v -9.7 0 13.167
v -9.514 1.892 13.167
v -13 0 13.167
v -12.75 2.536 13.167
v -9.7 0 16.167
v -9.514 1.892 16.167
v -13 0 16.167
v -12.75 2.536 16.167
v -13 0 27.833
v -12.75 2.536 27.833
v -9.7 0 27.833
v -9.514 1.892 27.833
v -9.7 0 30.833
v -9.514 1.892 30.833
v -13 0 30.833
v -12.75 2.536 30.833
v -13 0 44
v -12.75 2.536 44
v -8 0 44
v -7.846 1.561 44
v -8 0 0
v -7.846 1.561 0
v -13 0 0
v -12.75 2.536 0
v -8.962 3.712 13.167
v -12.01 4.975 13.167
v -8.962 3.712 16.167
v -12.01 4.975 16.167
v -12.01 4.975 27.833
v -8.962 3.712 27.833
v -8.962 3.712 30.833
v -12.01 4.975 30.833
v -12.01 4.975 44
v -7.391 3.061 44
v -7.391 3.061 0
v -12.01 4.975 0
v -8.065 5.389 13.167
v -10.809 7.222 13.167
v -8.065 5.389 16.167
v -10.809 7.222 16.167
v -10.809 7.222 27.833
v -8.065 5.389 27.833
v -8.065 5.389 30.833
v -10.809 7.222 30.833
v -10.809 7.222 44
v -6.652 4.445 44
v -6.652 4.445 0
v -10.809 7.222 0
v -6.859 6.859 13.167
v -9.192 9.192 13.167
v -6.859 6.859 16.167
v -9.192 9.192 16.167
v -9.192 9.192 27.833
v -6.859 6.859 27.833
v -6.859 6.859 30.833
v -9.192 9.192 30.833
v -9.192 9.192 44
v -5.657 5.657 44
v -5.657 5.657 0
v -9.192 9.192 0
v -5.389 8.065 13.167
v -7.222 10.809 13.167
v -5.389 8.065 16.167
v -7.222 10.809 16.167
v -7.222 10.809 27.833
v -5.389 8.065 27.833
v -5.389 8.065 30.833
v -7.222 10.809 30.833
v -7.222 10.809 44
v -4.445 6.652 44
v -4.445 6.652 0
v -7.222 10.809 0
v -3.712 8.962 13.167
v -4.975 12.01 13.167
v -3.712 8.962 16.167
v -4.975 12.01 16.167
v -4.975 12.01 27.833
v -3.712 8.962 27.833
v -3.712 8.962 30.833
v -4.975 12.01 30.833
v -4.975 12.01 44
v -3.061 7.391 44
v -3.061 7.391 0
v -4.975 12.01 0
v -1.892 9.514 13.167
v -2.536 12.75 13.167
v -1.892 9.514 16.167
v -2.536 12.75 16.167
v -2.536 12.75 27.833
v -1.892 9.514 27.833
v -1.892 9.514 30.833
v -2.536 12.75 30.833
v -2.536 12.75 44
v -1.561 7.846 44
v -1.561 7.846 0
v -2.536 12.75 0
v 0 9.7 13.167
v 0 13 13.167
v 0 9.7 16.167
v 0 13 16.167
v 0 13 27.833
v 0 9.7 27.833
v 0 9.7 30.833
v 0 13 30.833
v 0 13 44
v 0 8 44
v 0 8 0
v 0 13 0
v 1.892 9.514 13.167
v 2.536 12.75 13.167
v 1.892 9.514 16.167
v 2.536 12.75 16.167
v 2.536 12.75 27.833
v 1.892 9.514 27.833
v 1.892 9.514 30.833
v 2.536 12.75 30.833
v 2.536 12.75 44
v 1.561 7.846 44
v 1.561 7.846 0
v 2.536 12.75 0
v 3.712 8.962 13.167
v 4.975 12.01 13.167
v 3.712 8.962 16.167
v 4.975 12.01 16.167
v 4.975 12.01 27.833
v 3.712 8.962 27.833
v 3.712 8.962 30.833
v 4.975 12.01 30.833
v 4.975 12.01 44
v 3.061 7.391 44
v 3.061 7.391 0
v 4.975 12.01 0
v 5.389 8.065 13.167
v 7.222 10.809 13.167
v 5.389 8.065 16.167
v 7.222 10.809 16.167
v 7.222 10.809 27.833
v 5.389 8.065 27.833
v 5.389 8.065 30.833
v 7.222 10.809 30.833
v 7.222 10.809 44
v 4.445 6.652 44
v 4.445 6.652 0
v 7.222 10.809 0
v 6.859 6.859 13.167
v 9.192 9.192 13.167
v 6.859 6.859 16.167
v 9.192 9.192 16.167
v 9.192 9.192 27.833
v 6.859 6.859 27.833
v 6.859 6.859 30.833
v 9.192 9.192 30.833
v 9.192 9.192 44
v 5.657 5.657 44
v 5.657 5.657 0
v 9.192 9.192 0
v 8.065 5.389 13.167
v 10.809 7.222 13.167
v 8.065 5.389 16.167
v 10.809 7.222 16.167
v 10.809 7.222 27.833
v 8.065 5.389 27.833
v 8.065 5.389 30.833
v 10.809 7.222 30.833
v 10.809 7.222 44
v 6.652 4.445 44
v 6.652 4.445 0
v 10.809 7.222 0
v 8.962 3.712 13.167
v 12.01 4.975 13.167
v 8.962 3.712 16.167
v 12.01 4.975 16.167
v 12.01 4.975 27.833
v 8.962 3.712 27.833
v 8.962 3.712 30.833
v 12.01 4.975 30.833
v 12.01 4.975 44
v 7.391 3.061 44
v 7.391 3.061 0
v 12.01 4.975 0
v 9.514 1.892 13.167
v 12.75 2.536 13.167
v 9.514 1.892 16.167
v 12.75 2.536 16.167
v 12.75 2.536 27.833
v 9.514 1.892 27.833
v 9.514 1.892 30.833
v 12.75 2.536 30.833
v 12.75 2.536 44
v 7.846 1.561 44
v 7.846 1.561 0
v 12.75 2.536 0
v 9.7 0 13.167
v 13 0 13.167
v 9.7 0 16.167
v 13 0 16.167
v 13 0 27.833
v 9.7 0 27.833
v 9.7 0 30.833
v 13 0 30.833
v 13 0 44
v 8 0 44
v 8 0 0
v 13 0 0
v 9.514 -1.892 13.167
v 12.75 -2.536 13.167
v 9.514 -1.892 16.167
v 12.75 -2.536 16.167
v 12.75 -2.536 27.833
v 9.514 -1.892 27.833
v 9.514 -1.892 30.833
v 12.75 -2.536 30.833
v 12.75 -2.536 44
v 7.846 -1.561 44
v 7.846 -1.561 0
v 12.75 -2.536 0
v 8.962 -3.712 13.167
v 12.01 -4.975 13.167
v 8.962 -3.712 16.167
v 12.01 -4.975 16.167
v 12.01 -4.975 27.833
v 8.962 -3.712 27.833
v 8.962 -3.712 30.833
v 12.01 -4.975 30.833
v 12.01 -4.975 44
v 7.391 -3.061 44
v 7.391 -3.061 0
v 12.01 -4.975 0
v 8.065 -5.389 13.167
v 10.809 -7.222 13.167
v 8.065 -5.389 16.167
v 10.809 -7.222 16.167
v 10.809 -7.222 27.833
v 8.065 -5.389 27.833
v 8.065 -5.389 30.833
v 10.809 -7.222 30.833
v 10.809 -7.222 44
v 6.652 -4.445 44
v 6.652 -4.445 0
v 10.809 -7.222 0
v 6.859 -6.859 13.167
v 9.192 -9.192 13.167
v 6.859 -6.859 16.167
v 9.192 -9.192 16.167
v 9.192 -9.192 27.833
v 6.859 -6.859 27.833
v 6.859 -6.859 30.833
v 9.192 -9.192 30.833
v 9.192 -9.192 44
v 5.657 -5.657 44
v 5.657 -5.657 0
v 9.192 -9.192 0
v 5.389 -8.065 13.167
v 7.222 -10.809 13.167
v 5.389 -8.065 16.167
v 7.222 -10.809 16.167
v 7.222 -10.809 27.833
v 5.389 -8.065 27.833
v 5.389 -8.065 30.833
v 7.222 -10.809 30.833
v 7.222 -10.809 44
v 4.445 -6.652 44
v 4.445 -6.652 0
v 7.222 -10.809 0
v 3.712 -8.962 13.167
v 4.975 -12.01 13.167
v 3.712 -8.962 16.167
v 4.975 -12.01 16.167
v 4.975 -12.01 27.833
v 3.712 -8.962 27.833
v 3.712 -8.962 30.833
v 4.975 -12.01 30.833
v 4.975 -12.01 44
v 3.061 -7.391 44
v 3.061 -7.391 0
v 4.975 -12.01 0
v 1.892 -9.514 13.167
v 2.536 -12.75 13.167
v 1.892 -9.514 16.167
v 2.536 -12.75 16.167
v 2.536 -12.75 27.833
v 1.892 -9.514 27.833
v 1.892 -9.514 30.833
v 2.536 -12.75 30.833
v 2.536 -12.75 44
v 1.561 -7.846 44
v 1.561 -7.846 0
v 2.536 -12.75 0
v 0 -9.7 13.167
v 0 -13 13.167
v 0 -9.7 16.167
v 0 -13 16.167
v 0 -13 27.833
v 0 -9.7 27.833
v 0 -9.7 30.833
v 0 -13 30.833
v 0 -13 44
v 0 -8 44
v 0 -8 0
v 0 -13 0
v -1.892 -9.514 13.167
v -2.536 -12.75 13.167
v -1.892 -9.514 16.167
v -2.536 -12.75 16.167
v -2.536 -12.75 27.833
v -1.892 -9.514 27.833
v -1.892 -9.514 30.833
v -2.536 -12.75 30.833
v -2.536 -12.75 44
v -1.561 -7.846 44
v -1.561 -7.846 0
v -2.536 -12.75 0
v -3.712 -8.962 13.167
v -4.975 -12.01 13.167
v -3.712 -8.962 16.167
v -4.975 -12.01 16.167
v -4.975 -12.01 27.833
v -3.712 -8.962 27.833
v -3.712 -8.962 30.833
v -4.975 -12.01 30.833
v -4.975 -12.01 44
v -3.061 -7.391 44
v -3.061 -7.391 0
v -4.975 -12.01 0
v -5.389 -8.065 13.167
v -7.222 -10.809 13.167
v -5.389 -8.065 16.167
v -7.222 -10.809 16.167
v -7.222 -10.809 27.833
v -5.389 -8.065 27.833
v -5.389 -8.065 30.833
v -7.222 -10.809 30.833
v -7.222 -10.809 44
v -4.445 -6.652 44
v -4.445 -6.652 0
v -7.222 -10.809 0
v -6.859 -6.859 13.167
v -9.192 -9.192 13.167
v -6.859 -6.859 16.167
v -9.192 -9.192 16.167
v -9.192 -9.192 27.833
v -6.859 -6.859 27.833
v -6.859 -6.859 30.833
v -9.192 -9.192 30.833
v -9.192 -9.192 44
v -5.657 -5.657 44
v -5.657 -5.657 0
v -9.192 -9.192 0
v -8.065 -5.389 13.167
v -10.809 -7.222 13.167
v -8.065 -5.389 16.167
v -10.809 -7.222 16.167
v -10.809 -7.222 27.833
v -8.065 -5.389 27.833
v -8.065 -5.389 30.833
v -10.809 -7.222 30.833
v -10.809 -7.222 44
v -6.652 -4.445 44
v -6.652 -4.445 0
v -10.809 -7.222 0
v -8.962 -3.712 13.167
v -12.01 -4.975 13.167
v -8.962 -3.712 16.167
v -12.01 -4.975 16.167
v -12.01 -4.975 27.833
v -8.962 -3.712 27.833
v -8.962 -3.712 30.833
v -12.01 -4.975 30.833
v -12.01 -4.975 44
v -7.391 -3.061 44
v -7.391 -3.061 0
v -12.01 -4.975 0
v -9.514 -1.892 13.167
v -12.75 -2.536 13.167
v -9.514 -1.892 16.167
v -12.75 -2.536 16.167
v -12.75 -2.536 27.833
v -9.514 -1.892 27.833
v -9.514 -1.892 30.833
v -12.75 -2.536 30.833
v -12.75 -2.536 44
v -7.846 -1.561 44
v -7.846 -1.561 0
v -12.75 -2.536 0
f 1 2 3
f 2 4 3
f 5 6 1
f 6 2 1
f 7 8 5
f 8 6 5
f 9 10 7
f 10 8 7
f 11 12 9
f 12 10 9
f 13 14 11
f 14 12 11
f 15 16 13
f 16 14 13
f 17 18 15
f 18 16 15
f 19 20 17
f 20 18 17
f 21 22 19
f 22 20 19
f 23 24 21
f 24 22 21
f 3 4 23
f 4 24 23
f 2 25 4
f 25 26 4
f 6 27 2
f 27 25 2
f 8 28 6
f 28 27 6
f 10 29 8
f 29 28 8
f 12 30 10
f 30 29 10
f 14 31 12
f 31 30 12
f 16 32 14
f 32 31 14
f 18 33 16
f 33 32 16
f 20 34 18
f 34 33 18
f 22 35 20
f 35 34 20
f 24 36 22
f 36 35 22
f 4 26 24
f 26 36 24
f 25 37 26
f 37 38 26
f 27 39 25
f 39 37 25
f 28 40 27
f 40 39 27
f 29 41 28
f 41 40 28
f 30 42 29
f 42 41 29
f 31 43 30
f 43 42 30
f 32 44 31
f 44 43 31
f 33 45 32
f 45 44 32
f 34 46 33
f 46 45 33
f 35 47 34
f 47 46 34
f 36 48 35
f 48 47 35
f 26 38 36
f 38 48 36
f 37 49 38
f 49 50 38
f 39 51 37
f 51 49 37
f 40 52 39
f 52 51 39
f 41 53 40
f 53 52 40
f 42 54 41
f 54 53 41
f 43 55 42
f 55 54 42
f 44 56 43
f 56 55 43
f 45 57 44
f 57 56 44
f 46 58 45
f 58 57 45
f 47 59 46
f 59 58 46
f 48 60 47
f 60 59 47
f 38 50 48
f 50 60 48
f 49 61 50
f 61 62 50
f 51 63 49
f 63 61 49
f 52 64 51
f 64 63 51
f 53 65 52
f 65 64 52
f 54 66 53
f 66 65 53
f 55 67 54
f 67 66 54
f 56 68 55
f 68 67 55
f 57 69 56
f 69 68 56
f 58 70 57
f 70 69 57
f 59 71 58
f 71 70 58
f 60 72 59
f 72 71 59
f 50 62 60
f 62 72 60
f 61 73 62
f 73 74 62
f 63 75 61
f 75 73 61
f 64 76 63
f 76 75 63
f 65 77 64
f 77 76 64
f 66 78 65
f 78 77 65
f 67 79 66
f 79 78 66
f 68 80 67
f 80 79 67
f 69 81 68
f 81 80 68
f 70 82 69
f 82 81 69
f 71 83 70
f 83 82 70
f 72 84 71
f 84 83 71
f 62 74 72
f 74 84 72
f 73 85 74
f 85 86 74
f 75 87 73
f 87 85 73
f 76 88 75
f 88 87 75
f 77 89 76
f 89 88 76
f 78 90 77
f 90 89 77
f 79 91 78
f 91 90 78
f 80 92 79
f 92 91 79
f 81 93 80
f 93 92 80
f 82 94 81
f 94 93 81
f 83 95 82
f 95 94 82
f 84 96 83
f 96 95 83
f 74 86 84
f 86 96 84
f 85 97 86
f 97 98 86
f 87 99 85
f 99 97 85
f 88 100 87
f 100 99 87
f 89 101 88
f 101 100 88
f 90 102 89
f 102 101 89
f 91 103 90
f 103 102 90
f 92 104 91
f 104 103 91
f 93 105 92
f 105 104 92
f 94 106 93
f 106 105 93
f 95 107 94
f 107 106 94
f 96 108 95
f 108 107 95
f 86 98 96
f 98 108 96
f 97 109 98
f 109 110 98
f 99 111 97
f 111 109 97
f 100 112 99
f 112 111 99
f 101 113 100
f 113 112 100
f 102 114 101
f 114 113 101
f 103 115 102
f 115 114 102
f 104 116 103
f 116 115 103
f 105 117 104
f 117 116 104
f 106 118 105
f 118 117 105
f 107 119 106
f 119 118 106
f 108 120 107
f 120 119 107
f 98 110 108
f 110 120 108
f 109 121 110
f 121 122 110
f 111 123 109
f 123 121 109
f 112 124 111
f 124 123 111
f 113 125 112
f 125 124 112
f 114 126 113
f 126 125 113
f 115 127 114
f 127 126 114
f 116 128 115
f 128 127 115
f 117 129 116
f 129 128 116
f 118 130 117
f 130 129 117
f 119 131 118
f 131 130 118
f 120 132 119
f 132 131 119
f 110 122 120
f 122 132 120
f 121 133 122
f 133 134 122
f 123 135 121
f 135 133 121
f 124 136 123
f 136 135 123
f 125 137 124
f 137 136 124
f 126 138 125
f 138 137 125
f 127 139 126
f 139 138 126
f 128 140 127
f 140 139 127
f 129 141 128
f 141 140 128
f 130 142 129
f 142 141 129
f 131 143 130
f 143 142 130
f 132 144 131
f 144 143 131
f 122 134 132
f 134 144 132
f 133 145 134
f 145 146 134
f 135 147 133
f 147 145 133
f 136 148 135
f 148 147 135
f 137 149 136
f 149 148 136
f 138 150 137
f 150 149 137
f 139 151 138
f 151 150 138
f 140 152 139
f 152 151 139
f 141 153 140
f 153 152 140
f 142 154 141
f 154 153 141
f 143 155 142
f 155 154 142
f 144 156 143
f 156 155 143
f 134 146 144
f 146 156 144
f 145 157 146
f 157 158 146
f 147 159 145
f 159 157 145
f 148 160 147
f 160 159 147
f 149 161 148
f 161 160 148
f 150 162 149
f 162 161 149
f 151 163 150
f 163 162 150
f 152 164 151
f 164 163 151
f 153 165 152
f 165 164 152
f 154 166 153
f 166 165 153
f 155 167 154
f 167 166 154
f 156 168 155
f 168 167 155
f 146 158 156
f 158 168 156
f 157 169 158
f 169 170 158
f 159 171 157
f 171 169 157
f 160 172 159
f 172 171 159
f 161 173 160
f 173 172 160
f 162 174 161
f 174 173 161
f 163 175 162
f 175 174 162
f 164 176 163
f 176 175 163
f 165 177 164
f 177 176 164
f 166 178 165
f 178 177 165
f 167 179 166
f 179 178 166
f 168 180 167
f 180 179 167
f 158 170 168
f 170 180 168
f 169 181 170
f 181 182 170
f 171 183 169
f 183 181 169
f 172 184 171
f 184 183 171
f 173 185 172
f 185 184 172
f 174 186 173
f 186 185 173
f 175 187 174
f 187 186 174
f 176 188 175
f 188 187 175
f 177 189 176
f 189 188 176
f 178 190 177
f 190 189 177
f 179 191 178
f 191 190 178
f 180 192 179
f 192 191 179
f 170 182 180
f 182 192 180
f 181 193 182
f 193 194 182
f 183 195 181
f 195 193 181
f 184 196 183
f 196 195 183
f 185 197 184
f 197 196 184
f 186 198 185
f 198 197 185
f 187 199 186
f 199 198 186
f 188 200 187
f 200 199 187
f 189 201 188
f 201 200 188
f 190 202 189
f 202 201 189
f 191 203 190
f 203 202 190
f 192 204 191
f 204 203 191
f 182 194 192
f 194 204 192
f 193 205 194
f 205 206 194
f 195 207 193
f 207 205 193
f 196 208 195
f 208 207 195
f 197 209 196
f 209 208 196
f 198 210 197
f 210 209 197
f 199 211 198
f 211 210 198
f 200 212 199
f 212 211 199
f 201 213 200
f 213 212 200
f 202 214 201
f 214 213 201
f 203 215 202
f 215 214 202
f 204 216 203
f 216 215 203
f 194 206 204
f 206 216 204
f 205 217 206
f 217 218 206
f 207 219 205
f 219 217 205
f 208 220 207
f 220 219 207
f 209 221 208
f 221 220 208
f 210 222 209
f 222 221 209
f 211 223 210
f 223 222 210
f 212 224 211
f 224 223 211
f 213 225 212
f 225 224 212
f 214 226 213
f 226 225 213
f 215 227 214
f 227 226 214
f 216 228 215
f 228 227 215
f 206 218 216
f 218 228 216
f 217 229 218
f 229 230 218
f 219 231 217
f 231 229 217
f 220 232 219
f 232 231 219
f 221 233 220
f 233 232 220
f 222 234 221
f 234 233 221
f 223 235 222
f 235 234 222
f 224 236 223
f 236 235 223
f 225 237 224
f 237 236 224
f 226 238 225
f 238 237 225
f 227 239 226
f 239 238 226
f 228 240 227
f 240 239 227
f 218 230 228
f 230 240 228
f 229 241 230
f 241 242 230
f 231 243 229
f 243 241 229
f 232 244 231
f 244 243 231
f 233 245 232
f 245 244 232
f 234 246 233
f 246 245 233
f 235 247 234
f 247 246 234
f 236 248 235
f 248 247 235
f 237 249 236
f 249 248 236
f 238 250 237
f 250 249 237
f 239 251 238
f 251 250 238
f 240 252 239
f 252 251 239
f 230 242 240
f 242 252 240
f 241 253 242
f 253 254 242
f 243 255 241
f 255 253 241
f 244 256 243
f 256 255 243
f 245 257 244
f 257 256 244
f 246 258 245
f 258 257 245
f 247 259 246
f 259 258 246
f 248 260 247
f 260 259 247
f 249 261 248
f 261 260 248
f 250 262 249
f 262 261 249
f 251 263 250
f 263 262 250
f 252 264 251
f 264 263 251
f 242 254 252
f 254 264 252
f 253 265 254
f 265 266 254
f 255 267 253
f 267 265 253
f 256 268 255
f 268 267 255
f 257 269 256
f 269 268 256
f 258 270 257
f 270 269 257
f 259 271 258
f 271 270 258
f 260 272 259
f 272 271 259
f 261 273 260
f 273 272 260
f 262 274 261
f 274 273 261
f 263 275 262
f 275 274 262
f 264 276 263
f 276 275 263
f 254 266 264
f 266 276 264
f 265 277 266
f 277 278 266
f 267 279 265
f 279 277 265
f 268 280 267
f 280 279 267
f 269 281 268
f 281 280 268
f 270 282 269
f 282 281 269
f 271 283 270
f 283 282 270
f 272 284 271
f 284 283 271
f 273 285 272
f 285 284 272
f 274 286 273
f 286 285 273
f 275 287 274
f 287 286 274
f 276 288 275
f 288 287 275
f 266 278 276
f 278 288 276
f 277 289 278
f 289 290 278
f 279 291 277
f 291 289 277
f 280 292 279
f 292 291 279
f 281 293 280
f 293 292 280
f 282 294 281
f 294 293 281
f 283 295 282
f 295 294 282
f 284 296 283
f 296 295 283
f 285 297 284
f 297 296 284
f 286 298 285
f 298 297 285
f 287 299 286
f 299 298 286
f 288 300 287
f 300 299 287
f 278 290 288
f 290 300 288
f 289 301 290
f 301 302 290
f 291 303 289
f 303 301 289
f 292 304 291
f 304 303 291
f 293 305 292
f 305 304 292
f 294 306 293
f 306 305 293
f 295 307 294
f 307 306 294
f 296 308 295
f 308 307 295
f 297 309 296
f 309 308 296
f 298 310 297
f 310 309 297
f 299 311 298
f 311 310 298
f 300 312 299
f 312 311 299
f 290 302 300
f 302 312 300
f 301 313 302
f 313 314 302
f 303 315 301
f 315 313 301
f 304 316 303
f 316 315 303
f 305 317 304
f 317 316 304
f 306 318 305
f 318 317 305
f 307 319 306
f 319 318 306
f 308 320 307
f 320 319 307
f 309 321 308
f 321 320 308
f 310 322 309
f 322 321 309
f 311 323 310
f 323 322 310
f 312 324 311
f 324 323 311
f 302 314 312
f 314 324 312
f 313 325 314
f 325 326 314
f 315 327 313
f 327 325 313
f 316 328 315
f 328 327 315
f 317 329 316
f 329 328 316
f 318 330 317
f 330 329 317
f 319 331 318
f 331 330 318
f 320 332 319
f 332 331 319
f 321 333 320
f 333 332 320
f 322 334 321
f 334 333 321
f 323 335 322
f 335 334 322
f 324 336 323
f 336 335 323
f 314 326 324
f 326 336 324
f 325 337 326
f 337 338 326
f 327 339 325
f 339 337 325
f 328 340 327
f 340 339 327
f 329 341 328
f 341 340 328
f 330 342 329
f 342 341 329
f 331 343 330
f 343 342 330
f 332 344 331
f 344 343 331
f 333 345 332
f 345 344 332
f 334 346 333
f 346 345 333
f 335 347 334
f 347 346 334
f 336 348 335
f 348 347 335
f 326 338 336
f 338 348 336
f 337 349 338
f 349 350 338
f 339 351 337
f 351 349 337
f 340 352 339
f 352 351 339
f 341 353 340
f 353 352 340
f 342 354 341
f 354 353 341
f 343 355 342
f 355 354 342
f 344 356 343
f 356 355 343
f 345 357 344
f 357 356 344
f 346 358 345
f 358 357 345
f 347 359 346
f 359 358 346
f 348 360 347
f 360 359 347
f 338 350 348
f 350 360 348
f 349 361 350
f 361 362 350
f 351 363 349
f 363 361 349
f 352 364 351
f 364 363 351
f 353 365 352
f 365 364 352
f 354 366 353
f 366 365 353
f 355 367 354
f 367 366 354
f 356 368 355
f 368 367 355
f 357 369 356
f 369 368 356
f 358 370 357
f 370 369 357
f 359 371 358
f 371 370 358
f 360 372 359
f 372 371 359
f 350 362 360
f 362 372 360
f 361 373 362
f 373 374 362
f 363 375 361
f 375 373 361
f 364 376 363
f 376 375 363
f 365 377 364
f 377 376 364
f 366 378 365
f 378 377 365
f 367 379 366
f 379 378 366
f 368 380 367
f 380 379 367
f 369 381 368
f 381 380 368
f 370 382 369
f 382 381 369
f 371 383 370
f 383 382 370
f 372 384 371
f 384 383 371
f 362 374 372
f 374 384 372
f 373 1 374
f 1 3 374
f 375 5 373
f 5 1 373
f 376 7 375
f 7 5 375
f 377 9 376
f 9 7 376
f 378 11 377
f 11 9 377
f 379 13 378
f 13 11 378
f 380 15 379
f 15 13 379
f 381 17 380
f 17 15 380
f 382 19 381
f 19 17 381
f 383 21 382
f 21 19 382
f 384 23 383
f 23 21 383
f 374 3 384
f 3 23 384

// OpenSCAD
$fn = 32;

// ----------------------------------------------------------------------
// Grooved revolve: plain_grooves, bore R8
// ----------------------------------------------------------------------

// --- parameters (mm) ---
bore_r = 8;               // bore radius
outer_r = 13;             // outer radius of the body
total_h = 44;             // overall height, Z
wall = 5;                 // radial wall thickness
groove_w = 3;             // groove width
groove_d = 3.3;           // groove depth
grooves = 2;              // number of outer grooves

bbox_x = 2 * outer_r;  // full diameter
bore_d = 2 * bore_r;  // bore diameter
body_d = 2 * outer_r;  // body diameter
revolve_angle = 360;  // full turn around the Z axis

profile = [[8, 0], [13, 0], [13, 13.167], [9.7, 13.167], [9.7, 16.167], [13, 16.167], [13, 27.833], [9.7, 27.833], [9.7, 30.833], [13, 30.833], [13, 44], [8, 44]];  // primary outline, 12 points, counter clockwise

// --- the one profile operation ---
rotate_extrude(angle = revolve_angle) polygon(points = profile);
